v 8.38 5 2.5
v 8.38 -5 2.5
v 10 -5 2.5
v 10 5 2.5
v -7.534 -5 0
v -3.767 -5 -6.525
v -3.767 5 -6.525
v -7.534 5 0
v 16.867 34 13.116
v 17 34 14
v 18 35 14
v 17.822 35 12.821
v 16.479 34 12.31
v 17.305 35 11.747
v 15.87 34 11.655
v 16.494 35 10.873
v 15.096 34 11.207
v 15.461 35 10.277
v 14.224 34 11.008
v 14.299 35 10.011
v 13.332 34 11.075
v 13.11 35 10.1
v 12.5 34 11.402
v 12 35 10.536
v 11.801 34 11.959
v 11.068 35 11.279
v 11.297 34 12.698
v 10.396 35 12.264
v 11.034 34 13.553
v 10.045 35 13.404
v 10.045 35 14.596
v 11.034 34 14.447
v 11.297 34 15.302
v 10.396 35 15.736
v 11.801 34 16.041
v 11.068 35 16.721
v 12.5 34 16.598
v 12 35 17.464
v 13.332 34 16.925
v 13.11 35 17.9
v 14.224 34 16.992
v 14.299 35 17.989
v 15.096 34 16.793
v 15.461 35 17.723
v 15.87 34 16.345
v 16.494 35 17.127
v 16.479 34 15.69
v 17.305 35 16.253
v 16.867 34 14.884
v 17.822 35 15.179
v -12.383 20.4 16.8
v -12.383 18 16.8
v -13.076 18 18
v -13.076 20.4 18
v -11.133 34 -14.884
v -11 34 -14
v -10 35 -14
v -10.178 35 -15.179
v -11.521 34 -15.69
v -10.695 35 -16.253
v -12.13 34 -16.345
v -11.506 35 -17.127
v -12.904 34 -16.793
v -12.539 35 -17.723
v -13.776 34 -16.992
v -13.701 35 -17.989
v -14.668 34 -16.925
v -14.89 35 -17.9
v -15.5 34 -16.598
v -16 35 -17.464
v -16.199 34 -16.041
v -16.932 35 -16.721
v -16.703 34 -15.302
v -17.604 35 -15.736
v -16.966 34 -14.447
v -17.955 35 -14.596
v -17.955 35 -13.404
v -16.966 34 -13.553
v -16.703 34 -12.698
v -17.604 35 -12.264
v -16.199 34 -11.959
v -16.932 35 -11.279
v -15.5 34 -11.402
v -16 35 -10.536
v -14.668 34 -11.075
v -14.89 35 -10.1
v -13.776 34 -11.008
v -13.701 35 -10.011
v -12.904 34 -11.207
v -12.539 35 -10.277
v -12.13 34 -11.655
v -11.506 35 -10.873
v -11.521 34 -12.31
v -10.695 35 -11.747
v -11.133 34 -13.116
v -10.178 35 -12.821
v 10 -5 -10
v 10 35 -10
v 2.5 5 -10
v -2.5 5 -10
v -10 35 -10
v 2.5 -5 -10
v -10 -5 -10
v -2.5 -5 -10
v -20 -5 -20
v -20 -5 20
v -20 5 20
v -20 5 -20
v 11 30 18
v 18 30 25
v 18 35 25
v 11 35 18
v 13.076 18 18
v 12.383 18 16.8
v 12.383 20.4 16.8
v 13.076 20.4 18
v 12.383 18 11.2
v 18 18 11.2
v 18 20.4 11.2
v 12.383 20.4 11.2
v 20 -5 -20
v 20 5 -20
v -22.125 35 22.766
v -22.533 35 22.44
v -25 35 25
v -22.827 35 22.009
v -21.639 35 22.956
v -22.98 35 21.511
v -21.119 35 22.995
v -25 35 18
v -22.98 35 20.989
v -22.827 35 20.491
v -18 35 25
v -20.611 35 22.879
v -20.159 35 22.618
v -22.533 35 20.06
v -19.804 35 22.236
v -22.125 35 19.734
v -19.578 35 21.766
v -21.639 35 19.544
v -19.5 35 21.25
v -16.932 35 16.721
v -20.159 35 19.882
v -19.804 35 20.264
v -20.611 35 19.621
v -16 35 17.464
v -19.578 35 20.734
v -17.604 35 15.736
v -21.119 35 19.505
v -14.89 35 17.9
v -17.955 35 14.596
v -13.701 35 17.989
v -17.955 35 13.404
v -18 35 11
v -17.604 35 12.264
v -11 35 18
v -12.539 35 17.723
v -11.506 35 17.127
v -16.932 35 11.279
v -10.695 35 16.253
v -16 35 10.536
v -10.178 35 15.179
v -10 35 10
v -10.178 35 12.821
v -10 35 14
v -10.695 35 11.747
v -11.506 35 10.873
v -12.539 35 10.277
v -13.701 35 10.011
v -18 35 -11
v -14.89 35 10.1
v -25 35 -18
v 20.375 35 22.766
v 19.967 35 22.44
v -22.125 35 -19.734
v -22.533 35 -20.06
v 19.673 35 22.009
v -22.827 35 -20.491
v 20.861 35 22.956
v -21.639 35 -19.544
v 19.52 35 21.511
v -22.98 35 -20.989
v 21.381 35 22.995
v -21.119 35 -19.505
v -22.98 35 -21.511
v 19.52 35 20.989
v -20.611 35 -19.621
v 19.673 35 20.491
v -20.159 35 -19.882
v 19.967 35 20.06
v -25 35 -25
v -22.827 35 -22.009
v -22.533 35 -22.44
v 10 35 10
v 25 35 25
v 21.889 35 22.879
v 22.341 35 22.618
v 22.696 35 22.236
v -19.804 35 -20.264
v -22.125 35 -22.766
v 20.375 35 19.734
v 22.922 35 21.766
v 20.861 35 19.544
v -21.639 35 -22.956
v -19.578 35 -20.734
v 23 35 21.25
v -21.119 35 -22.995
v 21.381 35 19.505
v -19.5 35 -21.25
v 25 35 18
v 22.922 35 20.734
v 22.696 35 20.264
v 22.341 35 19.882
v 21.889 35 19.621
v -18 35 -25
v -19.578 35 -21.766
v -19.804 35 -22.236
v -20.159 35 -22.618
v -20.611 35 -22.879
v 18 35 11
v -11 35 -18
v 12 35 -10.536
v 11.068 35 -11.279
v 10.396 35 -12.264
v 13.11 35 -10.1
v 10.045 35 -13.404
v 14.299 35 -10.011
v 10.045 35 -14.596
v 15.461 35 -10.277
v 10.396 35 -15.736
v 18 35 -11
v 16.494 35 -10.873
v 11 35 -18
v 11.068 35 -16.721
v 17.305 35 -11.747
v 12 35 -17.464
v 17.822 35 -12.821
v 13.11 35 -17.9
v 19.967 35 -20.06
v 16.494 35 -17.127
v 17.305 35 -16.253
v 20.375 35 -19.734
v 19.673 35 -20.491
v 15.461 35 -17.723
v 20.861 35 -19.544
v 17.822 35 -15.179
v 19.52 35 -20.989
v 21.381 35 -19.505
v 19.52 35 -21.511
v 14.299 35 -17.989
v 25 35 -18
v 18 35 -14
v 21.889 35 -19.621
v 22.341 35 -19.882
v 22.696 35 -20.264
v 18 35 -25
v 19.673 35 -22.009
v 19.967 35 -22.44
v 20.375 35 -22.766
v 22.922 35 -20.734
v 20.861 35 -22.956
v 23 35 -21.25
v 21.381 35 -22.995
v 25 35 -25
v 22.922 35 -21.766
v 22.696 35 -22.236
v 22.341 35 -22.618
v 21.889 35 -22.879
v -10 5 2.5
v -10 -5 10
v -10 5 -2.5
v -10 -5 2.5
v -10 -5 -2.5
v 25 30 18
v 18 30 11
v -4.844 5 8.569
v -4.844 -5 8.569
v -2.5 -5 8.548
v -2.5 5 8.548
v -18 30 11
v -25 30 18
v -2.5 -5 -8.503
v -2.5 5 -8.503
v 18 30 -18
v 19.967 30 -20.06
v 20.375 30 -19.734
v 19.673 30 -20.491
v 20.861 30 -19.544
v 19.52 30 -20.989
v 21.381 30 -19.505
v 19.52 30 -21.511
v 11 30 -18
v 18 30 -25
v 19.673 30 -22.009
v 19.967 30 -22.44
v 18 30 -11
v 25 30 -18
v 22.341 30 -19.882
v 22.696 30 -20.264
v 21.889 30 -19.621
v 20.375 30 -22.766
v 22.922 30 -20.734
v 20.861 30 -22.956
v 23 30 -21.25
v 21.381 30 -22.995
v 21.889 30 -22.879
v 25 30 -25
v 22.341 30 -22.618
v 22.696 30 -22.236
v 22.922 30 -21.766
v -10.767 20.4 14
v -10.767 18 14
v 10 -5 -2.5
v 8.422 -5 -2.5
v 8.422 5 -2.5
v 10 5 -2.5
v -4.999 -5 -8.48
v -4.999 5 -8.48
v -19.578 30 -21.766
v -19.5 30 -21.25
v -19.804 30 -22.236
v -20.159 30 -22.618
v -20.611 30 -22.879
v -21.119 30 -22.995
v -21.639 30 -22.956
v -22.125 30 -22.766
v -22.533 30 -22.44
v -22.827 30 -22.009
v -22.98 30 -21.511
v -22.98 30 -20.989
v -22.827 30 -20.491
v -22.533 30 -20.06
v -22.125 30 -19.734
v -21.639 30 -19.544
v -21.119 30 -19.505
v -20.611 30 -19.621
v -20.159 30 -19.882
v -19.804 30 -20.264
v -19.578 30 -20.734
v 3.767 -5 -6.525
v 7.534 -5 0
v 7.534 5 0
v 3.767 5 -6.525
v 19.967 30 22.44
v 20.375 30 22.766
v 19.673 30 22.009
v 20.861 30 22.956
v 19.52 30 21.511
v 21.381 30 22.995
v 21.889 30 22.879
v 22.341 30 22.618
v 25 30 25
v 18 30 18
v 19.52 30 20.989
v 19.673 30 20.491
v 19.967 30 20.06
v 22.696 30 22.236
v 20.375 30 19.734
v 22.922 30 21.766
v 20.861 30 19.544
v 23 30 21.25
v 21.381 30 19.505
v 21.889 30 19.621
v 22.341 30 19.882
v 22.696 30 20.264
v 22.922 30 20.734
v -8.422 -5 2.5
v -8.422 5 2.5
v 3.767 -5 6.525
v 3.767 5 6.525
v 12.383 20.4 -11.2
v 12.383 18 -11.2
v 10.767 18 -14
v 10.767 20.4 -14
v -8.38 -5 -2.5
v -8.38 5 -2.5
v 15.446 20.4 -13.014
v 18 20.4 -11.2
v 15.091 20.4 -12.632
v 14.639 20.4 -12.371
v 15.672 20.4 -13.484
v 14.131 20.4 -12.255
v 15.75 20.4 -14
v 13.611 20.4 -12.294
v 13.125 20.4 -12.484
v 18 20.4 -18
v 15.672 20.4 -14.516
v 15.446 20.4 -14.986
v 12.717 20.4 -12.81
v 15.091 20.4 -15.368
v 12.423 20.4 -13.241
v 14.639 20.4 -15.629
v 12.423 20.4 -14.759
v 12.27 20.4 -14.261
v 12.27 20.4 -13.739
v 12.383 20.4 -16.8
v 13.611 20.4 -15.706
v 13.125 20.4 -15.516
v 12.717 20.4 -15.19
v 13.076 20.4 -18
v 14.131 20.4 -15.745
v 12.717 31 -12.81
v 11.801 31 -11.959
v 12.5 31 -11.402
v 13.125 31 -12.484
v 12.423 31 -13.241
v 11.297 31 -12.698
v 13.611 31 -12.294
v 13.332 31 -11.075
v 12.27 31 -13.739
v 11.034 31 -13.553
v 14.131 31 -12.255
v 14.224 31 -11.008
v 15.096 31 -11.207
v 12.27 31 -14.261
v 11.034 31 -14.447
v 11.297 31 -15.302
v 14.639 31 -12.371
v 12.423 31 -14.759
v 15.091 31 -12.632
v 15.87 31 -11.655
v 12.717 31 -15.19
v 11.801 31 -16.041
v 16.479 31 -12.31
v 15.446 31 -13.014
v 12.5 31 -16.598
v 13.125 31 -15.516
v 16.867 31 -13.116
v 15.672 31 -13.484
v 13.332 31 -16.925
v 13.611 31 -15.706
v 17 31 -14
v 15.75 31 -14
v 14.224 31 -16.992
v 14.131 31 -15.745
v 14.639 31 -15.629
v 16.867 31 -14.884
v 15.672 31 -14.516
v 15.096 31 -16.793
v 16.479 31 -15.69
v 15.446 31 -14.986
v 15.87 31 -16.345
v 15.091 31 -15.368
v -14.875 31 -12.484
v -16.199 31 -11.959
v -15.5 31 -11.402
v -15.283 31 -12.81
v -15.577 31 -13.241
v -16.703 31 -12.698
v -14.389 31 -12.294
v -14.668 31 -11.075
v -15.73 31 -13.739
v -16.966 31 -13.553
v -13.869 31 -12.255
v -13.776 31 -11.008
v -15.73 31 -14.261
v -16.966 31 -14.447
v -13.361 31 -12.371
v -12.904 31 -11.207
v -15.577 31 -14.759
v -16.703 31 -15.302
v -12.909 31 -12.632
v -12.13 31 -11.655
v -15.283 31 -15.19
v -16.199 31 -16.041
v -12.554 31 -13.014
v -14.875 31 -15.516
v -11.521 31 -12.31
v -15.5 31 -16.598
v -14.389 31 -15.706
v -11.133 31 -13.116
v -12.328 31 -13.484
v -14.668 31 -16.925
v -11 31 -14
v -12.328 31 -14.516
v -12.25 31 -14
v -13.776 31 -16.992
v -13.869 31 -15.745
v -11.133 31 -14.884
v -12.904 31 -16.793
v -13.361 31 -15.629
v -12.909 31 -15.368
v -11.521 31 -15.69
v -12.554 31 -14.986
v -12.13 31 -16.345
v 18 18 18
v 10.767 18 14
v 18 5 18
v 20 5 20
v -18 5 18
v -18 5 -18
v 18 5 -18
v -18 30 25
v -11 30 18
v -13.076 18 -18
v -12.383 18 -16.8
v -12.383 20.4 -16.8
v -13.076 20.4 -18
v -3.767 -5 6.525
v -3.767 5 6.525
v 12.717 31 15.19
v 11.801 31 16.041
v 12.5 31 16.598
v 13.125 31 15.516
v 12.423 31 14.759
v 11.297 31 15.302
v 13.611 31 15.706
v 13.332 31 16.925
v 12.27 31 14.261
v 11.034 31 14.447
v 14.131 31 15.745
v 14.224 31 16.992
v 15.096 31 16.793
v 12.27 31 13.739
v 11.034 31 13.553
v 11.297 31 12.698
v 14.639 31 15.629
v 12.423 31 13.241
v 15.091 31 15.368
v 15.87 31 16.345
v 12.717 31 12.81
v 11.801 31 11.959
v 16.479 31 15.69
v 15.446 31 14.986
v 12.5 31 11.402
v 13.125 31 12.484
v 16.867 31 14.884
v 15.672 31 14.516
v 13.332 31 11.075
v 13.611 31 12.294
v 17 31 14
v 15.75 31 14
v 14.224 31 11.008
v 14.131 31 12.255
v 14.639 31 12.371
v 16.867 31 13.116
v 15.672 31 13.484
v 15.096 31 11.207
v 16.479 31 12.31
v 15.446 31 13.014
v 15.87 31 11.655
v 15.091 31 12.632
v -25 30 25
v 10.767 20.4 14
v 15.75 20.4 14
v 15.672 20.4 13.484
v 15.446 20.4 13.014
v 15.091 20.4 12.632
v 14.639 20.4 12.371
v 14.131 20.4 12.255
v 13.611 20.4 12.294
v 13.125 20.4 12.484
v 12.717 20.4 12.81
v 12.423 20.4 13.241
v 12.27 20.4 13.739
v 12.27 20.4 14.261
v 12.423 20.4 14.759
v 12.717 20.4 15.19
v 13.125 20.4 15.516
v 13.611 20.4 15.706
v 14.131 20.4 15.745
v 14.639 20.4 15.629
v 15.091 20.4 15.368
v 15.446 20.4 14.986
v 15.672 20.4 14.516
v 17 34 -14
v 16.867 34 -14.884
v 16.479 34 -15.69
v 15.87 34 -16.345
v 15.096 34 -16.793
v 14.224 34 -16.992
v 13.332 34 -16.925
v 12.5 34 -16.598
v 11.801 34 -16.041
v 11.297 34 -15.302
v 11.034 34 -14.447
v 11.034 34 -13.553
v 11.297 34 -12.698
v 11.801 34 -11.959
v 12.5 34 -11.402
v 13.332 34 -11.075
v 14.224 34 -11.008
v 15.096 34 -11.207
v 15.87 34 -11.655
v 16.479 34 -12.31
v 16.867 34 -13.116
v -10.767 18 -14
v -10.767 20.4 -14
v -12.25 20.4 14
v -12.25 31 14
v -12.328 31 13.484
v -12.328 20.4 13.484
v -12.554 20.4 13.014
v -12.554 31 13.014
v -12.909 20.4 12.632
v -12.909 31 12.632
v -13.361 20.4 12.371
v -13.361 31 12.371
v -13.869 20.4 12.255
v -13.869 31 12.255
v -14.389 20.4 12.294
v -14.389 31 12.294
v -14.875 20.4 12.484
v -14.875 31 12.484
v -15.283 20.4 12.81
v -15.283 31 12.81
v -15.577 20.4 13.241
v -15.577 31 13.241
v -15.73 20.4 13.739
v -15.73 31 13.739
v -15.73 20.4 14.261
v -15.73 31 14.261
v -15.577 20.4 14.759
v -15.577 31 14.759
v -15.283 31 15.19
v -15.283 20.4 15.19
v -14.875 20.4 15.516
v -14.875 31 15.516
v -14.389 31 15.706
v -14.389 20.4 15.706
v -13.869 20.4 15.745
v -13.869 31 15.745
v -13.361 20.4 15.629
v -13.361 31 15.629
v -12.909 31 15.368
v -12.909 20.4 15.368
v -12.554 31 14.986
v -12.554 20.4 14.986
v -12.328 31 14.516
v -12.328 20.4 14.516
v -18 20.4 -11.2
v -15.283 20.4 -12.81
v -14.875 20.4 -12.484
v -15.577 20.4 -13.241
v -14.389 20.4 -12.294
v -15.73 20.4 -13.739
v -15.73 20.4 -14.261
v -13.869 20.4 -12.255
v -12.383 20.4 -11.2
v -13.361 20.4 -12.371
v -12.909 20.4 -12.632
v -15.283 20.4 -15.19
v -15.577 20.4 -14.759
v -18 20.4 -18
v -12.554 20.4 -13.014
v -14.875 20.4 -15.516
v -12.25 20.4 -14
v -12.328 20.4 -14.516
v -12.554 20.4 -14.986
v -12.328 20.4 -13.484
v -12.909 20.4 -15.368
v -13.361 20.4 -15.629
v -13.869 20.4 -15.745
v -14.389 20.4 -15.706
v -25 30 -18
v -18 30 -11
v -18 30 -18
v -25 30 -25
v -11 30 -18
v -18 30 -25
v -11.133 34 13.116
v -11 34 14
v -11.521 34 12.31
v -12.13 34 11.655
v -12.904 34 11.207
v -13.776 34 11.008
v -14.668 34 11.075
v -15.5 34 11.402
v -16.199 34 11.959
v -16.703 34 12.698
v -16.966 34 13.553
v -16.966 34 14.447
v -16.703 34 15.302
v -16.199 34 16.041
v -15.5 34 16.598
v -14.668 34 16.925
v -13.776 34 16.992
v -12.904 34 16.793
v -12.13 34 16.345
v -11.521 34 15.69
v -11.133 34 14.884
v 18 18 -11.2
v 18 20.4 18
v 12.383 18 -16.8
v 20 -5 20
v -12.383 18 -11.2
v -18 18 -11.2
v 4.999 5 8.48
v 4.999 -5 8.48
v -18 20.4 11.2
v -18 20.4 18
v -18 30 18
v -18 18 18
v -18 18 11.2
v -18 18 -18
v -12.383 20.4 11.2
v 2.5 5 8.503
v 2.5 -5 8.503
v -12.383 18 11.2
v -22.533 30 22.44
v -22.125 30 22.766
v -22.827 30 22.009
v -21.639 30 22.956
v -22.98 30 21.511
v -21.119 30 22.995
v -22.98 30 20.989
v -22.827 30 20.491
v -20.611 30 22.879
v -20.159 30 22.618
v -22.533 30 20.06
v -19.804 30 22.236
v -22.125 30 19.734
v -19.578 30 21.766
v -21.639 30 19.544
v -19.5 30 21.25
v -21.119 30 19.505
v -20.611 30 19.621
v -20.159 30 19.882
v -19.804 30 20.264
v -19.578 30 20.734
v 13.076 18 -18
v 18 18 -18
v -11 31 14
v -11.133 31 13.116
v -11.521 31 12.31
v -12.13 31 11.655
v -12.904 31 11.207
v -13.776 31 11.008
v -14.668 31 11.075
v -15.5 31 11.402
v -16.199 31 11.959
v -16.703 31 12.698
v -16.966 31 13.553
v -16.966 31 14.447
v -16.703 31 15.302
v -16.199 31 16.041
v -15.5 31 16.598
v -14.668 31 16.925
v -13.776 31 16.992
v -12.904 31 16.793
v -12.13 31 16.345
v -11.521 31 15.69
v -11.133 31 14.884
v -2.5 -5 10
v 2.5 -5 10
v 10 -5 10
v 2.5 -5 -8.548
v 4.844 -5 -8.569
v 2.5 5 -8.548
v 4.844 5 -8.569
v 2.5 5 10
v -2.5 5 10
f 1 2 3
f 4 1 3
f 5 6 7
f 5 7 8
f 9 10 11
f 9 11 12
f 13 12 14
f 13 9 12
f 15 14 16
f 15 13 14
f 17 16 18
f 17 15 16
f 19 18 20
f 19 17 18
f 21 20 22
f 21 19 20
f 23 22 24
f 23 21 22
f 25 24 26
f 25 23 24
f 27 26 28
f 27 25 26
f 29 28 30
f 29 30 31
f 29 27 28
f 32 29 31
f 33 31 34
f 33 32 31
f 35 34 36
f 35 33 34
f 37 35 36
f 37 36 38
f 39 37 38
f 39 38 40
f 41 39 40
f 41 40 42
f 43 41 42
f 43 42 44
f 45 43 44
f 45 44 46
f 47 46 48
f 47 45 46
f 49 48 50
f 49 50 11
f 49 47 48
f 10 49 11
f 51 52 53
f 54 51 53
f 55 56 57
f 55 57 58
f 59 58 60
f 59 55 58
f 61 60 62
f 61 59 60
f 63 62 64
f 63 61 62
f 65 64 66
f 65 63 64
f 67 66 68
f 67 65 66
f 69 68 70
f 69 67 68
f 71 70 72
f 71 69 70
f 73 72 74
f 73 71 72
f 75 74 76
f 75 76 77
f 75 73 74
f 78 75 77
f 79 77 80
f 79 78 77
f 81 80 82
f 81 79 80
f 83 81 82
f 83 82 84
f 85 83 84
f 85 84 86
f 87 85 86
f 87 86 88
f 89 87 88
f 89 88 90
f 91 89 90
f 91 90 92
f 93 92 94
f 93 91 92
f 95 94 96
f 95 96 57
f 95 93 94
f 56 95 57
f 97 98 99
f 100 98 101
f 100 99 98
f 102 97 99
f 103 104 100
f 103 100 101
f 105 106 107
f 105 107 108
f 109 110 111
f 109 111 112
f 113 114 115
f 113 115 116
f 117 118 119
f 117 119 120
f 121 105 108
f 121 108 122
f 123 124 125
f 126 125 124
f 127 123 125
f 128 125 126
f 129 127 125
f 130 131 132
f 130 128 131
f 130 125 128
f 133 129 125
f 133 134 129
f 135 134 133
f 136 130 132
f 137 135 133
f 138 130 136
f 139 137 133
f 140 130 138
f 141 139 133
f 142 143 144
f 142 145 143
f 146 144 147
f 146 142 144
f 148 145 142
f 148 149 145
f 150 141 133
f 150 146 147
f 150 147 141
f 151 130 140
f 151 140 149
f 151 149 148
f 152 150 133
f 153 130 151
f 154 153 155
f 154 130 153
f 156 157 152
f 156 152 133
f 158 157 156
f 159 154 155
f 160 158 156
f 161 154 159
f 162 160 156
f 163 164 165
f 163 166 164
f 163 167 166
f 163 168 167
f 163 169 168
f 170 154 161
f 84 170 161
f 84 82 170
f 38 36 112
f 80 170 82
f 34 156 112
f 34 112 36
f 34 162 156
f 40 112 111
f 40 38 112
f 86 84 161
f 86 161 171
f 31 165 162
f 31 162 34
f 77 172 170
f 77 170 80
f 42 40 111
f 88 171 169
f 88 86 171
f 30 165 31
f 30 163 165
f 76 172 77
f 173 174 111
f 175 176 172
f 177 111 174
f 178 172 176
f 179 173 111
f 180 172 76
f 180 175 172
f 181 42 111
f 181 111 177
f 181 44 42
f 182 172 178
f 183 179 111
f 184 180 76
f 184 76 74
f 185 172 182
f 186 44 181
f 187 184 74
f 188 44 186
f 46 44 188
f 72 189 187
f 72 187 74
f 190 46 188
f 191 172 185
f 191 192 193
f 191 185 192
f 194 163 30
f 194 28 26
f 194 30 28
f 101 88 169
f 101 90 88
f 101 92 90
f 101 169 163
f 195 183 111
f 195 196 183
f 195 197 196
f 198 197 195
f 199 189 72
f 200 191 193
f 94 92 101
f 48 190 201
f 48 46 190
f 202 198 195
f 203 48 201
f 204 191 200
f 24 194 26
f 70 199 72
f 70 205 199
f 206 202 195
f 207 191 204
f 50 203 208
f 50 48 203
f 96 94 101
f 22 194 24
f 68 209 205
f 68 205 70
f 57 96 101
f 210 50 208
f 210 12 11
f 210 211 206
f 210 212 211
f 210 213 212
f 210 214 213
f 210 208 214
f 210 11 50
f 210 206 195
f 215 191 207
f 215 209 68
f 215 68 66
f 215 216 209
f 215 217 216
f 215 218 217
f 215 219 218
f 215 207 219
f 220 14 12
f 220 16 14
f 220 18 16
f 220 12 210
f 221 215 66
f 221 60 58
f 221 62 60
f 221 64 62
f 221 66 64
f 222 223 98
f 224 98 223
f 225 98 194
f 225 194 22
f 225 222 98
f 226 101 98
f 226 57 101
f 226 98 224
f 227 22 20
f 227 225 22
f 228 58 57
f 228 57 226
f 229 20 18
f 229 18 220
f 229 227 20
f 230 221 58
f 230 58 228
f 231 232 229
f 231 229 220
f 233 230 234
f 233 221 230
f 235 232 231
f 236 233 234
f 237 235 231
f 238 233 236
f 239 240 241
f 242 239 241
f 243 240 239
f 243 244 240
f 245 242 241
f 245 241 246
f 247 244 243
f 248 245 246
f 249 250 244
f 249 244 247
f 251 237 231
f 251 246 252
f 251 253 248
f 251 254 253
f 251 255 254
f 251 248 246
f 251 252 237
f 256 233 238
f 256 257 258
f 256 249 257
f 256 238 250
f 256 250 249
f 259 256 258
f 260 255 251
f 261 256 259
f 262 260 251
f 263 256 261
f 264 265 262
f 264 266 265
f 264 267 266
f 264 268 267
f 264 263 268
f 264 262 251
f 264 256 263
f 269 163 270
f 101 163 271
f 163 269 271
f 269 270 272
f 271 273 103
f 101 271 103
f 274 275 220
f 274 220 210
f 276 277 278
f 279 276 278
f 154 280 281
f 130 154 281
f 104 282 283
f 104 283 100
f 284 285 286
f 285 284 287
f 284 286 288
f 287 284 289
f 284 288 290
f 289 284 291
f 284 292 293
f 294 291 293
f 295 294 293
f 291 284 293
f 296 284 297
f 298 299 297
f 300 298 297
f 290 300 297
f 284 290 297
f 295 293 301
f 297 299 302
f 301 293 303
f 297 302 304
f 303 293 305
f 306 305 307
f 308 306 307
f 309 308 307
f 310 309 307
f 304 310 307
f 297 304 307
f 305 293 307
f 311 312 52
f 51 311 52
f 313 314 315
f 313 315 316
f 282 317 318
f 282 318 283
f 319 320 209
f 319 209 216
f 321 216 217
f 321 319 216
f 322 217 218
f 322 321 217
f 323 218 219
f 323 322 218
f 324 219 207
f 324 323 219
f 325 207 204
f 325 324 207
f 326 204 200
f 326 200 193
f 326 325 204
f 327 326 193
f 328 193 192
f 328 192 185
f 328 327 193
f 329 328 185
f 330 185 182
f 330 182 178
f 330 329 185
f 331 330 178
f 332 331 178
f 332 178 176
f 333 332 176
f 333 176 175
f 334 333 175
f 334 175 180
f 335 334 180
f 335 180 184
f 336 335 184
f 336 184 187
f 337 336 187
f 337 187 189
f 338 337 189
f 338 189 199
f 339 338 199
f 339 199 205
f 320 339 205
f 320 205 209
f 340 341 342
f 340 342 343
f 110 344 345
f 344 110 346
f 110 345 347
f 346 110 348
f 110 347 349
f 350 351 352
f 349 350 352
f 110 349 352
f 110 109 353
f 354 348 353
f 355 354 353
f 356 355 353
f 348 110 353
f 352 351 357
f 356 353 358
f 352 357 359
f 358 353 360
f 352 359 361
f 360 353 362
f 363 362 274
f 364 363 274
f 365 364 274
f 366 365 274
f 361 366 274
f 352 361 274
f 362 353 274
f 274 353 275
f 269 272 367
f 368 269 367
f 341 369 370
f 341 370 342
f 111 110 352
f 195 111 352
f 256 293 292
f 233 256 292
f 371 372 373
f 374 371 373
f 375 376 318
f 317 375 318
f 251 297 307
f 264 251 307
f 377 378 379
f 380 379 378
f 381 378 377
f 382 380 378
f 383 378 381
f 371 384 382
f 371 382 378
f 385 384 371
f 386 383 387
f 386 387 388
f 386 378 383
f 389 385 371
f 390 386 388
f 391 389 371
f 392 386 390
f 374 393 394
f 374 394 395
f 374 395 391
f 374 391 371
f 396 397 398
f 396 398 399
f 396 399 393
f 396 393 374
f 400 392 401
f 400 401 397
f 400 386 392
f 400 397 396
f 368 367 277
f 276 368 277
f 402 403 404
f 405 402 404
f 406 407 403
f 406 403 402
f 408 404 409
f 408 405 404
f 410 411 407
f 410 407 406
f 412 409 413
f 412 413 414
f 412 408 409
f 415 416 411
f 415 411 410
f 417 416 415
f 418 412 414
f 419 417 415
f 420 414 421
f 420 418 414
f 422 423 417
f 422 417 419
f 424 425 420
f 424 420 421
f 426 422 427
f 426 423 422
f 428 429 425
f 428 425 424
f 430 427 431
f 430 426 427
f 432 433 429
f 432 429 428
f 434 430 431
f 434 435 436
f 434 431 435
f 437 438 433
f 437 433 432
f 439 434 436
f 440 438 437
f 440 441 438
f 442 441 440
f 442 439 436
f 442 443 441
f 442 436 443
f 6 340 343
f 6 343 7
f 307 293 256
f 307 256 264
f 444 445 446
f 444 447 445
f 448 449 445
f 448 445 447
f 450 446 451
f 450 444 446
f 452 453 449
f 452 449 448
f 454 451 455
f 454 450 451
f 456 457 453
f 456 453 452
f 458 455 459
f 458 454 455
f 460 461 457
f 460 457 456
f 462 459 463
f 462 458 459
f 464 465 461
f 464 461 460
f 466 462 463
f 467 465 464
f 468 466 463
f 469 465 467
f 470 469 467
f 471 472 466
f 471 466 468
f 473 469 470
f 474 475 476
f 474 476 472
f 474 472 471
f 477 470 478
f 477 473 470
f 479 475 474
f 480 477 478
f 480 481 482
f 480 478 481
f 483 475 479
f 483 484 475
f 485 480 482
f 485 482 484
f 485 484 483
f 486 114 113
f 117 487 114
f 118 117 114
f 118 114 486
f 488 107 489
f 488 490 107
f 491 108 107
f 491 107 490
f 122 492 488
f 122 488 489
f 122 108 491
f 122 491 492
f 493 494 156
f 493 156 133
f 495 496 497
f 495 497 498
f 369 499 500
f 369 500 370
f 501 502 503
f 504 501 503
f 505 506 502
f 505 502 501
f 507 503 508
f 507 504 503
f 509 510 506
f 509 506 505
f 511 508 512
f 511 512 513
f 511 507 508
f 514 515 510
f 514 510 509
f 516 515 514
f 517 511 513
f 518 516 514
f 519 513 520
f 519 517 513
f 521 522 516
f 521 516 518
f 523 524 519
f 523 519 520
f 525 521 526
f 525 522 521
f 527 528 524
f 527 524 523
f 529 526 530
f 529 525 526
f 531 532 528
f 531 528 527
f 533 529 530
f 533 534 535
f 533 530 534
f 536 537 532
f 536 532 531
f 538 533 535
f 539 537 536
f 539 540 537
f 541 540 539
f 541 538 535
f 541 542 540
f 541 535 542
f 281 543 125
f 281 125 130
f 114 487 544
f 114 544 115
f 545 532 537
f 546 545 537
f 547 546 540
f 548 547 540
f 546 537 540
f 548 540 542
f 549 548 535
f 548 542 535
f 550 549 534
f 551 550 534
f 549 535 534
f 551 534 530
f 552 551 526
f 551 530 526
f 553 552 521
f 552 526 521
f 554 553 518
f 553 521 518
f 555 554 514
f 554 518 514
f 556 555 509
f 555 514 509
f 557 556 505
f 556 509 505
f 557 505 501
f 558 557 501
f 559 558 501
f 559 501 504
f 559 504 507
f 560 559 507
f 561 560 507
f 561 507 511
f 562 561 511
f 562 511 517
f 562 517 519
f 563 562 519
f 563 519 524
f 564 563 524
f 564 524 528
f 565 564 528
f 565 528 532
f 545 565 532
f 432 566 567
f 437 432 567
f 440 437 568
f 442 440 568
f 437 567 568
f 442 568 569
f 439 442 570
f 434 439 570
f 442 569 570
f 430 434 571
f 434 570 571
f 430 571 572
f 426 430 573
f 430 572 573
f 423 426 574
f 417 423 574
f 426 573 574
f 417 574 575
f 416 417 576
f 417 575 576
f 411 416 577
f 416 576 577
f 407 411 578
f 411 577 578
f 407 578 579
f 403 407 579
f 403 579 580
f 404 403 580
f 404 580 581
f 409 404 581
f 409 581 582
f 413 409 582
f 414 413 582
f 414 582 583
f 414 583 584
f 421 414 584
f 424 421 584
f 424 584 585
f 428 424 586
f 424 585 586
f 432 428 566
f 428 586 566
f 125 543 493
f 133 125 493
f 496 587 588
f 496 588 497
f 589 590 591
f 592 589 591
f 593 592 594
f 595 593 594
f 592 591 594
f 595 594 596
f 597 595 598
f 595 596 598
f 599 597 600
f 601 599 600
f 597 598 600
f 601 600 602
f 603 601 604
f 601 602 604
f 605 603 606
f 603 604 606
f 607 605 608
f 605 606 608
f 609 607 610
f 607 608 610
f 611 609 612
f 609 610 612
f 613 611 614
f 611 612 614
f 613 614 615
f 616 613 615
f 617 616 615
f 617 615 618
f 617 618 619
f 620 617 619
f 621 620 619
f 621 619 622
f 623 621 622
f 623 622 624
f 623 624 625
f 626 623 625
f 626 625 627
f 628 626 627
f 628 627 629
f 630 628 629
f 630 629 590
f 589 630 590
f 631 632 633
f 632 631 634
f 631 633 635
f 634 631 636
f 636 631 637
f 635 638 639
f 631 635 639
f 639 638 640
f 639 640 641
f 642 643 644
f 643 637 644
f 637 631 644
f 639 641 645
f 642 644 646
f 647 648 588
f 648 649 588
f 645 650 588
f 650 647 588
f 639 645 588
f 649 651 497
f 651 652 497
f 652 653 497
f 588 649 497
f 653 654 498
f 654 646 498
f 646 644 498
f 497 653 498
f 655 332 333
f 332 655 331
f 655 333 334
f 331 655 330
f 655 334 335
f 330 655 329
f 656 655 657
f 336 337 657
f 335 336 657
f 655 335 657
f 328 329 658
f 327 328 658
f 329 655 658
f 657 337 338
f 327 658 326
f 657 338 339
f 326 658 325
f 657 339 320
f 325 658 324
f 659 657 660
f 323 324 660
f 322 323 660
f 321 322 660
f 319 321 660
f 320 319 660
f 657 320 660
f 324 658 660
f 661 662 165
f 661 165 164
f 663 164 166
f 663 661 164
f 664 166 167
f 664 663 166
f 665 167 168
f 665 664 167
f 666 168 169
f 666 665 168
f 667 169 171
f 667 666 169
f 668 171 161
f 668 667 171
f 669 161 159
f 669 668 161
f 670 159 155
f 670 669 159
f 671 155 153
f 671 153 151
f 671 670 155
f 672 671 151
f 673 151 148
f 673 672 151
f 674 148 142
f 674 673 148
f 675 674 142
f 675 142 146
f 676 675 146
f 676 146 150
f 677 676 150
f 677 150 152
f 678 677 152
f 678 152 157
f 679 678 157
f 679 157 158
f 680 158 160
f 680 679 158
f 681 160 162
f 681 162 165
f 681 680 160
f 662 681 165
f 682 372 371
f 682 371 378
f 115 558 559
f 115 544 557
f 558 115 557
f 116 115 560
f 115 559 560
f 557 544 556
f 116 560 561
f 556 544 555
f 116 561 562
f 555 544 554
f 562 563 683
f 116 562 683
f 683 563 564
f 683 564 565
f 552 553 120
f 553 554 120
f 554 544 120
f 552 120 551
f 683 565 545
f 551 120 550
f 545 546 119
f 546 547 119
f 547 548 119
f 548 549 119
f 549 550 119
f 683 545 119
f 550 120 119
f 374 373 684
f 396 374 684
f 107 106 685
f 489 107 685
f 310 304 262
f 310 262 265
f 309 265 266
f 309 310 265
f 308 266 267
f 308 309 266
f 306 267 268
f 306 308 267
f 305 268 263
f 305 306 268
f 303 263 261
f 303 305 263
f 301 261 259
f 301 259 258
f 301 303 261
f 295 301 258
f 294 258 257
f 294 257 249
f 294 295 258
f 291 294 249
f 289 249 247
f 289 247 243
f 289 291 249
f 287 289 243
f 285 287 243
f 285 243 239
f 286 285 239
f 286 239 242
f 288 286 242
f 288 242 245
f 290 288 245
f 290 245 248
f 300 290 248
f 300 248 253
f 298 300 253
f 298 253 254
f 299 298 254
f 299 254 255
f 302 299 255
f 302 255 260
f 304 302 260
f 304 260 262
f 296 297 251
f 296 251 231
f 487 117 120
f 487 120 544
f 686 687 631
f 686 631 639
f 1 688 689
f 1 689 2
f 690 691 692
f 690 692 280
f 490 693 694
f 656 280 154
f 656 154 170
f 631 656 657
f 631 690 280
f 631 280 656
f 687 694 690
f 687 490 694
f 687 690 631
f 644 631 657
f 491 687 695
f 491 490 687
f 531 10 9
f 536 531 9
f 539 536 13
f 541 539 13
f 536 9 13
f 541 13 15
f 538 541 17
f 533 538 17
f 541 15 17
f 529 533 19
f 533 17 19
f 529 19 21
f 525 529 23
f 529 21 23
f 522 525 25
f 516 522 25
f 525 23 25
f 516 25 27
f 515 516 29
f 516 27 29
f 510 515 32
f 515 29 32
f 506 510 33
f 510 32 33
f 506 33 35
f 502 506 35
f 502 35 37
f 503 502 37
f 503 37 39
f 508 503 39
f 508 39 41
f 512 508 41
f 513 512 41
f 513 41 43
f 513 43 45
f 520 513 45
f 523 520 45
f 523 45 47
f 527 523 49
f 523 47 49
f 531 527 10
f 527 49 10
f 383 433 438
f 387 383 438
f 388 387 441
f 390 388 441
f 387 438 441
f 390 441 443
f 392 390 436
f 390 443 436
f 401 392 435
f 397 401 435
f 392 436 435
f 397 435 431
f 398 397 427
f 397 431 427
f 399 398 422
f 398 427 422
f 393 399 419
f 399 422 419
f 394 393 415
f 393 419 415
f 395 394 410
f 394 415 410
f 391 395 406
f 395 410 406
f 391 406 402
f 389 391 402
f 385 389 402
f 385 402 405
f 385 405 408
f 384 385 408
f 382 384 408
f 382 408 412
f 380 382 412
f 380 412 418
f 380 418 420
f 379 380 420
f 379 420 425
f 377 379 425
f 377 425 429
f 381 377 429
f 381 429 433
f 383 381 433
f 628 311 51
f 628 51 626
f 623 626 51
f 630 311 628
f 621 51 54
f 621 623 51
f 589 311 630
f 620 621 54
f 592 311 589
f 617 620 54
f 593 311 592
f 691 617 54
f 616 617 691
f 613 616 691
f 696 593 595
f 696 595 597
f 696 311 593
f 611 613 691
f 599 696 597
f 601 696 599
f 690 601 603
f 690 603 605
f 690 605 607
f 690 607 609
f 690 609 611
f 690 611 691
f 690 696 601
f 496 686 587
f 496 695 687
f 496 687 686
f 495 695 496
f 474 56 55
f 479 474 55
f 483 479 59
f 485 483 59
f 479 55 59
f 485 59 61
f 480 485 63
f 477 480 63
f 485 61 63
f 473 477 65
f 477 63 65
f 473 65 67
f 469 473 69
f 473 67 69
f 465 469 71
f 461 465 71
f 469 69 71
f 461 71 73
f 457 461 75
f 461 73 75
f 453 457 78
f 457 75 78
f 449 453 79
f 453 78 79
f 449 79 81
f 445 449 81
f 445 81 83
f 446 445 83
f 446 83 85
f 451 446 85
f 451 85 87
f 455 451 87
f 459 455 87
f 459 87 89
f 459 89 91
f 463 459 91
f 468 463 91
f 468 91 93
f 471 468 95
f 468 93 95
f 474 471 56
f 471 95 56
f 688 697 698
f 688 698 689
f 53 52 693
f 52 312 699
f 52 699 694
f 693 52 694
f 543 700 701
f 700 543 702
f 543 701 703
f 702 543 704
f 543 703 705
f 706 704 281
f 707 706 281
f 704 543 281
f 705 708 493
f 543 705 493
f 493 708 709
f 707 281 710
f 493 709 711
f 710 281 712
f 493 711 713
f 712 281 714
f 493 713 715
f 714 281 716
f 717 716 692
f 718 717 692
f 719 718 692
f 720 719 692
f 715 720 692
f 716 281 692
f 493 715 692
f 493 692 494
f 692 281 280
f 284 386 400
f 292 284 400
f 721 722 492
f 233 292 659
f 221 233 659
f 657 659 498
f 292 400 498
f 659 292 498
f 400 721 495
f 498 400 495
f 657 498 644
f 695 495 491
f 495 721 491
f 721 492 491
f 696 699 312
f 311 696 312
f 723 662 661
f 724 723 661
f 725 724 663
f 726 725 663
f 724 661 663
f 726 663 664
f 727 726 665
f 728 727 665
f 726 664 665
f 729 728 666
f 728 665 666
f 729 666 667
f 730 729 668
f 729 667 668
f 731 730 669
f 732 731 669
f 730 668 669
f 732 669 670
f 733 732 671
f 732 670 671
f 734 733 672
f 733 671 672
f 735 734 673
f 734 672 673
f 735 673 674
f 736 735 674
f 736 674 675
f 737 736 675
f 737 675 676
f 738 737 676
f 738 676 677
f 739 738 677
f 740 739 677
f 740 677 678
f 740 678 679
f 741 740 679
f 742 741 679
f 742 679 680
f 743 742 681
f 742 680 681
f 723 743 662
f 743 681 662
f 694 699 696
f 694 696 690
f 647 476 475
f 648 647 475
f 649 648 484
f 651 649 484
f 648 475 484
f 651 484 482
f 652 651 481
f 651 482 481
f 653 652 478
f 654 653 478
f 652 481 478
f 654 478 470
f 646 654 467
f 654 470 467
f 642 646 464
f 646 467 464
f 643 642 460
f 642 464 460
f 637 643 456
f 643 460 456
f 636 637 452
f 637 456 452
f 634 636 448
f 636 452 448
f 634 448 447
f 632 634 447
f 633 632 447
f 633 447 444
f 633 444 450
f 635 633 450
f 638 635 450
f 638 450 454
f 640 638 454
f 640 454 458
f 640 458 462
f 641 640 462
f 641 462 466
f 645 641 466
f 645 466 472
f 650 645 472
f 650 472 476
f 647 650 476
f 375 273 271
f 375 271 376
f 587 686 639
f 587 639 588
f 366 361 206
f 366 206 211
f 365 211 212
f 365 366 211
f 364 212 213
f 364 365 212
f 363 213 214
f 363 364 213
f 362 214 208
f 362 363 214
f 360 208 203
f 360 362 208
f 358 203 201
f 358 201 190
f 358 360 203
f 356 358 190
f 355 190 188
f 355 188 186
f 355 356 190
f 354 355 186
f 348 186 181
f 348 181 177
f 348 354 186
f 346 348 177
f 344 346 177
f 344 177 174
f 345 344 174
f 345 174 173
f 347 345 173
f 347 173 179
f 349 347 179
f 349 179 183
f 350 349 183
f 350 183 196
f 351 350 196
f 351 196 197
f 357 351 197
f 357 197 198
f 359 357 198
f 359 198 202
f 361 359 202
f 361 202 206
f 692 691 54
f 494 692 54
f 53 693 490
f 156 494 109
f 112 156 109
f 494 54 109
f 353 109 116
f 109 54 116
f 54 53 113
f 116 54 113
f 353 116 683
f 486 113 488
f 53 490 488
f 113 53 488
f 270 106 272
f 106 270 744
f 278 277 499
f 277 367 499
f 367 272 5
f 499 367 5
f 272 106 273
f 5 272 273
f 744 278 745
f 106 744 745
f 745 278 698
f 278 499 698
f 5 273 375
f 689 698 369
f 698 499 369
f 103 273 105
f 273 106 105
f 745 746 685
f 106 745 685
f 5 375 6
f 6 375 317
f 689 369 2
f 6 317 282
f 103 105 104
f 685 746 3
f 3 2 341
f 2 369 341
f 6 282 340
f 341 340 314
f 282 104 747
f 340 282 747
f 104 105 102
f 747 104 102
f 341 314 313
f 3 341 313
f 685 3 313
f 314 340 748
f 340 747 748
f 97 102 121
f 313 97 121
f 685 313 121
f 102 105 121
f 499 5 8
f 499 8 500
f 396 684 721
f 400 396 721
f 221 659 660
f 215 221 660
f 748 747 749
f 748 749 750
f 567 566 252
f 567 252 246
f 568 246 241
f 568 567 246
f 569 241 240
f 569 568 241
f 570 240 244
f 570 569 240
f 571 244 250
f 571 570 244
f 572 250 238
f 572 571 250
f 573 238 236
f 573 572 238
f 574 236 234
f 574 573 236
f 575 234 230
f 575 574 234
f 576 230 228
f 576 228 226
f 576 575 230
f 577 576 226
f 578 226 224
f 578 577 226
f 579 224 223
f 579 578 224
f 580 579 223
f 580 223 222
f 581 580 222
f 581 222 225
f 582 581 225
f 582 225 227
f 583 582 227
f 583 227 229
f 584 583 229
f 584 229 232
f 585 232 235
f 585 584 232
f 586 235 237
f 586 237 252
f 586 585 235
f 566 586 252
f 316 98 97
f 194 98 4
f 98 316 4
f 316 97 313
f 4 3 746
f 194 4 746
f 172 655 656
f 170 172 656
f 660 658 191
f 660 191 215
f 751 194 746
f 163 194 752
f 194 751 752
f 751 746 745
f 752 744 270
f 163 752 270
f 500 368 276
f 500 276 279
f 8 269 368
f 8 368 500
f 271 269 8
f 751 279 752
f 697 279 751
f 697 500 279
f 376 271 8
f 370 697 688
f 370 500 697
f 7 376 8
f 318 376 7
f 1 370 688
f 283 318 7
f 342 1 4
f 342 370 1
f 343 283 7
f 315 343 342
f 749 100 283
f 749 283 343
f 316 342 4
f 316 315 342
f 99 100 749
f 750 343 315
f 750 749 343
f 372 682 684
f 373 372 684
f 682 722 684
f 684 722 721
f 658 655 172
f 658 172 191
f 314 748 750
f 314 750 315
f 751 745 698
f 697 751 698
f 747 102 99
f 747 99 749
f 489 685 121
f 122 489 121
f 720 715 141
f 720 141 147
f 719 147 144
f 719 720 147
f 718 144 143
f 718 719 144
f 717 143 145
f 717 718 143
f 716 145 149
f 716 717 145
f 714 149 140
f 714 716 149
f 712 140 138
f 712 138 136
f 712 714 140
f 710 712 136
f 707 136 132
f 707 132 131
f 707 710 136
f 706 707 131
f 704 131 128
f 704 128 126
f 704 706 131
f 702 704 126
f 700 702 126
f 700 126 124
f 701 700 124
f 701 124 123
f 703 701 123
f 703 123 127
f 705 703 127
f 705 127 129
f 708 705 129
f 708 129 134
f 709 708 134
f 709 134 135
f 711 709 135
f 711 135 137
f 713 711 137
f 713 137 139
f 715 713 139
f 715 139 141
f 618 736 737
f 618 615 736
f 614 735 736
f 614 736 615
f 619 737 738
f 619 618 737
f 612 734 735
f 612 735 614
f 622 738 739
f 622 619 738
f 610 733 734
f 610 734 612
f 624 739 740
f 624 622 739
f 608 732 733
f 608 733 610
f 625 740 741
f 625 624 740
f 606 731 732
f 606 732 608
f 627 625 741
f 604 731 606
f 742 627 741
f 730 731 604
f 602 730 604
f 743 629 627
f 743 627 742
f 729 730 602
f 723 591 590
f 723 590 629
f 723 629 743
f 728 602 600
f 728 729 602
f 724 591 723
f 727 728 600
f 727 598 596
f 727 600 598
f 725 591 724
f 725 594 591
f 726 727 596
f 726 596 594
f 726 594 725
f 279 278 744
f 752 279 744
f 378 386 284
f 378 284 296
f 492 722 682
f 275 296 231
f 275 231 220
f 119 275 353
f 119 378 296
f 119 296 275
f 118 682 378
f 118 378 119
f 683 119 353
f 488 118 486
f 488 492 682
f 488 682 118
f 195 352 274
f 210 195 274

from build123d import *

# Parameters (mm, degrees)
SKETCH1_W           = 36
SKETCH1_H           = 36
SKETCH1_W_2         = 20
SKETCH1_H_2         = 20
BOSS_EXTRUDE4_DEPTH = 35
SKETCH9_W           = 50
SKETCH9_H           = 50
SKETCH9_W_2         = 22
SKETCH9_H_2         = 22
BOSS_EXTRUDE6_DEPTH = 5
SKETCH10_R          = 1.75
CUT_EXTRUDE2_DEPTH  = 10
CUT_EXTRUDE3_DEPTH  = 10
SKETCH4_W           = 40
SKETCH4_H           = 40
BOSS_EXTRUDE7_DEPTH = 10
SKETCH12_R          = 3
CUT_EXTRUDE4_DEPTH  = 4
CHAMFER1_SIZE       = 1
SKETCH13_R          = 1.75
CUT_EXTRUDE5_DEPTH  = 13
CUT_EXTRUDE7_DEPTH  = 2.4


with BuildPart() as part:
    # Sketch1 → Boss-Extrude4 (new body)
    with BuildSketch(Plane(origin=(0, 0, 0), x_dir=(1, 0, 0), z_dir=(0, 1, 0))):
        Rectangle(SKETCH1_W, SKETCH1_H)
        Rectangle(SKETCH1_W_2, SKETCH1_H_2, mode=Mode.SUBTRACT)
    extrude(amount=BOSS_EXTRUDE4_DEPTH)

    # Sketch9 → Boss-Extrude6 (add)
    with BuildSketch(Plane(origin=(0, 30, 0), x_dir=(1, 0, 0), z_dir=(0, 1, 0))):
        Rectangle(SKETCH9_W, SKETCH9_H)
        Rectangle(SKETCH9_W_2, SKETCH9_H_2, mode=Mode.SUBTRACT)
    extrude(amount=BOSS_EXTRUDE6_DEPTH)

    # Sketch10 → Cut-Extrude2 (cut)
    with BuildSketch(Plane(origin=(0, 25, 0), x_dir=(1, 0, 0), z_dir=(0, 1, 0))):
        with Locations((-21.25, 21.25)):
            Circle(SKETCH10_R)
        with Locations((21.25, 21.25)):
            Circle(SKETCH10_R)
        with Locations((21.25, -21.25)):
            Circle(SKETCH10_R)
        with Locations((-21.25, -21.25)):
            Circle(SKETCH10_R)
    extrude(amount=CUT_EXTRUDE2_DEPTH, mode=Mode.SUBTRACT)

    # Sketch11 → Cut-Extrude3 (cut)
    with BuildSketch(Plane(origin=(0, 25, 0), x_dir=(1, 0, 0), z_dir=(0, 1, 0))):
        Polygon((11, 18), (-11, 18), (-18, 25), (18, 25), align=None)
        Polygon((18, 11), (18, -11), (25, -18), (25, 18), align=None)
        Polygon((11, -18), (-11, -18), (-18, -25), (18, -25), align=None)
        Polygon((-18, 11), (-18, -11), (-25, -18), (-25, 18), align=None)
    extrude(amount=CUT_EXTRUDE3_DEPTH, mode=Mode.SUBTRACT)

    # Sketch4 → Boss-Extrude7 (add)
    with BuildSketch(Plane(origin=(0, -5, 0), x_dir=(1, 0, 0), z_dir=(0, 1, 0))):
        Rectangle(SKETCH4_W, SKETCH4_H)
        Polygon((-2.5, -8.548100716), (-2.5, -10), (-10, -10), (-10, -2.5), (-8.422351936, -2.5), (-4.844140472, -8.569430344), align=None, mode=Mode.SUBTRACT)
        Polygon((7.534421013, 0), (3.767210506, 6.525), (-3.767210506, 6.525), (-7.534421013, 0), (-3.767210506, -6.525), (3.767210506, -6.525), align=None, mode=Mode.SUBTRACT)
        Polygon((10, 10), (2.5, 10), (2.5, 8.548100716), (4.844140472, 8.569430344), (8.422351936, 2.5), (10, 2.5), align=None, mode=Mode.SUBTRACT)
        Polygon((10, -10), (2.5, -10), (2.5, -8.502605089), (4.999274138, -8.47986388), (8.379580585, -2.5), (10, -2.5), align=None, mode=Mode.SUBTRACT)
        Polygon((-10, 10), (-10, 2.5), (-8.379580585, 2.5), (-4.999274138, 8.47986388), (-2.5, 8.502605089), (-2.5, 10), align=None, mode=Mode.SUBTRACT)
    extrude(amount=BOSS_EXTRUDE7_DEPTH)

    # Sketch12 → Cut-Extrude4 (cut)
    with BuildSketch(Plane(origin=(0, 35, 0), x_dir=(1, 0, 0), z_dir=(0, 1, 0))):
        with Locations((-14, 14)):
            Circle(SKETCH12_R)
        with Locations((14, 14)):
            Circle(SKETCH12_R)
        with Locations((-14, -14)):
            Circle(SKETCH12_R)
        with Locations((14, -14)):
            Circle(SKETCH12_R)
    extrude(amount=-CUT_EXTRUDE4_DEPTH, mode=Mode.SUBTRACT)

    # Chamfer1
    chamfer1_edges = [part.edges().sort_by_distance(p)[0] for p in [
        (11, 35, -14),
        (-17, 35, 14),
        (11, 35, 14),
        (-17, 35, -14),
    ]]
    chamfer(chamfer1_edges, length=CHAMFER1_SIZE)

    # Sketch13 → Cut-Extrude5 (cut)
    with BuildSketch(Plane(origin=(0, 31, 0), x_dir=(1, 0, 0), z_dir=(0, 1, 0))):
        with Locations((-14, 14)):
            Circle(SKETCH13_R)
        with Locations((14, 14)):
            Circle(SKETCH13_R)
        with Locations((14, -14)):
            Circle(SKETCH13_R)
        with Locations((-14, -14)):
            Circle(SKETCH13_R)
    extrude(amount=-CUT_EXTRUDE5_DEPTH, mode=Mode.SUBTRACT)

    # Sketch15 → Cut-Extrude7 (cut)
    with BuildSketch(Plane(origin=(0, 18, 0), x_dir=(1, 0, 0), z_dir=(0, 1, 0))):
        Polygon((-10.766838493, 14), (-12.383419246, 16.8), (-15.581535205, 22.339299329), (-24.484943605, 19.967960566), (-22.149680093, 11.2), (-15.616580754, 11.2), (-12.383419246, 11.2), align=None)
        Polygon((15.616580754, 11.2), (12.383419246, 11.2), (10.766838493, 14), (12.383419246, 16.8), (15.581535205, 22.339299329), (24.484943605, 19.967960566), (22.149680093, 11.2), align=None)
        Polygon((15.616580754, -11.2), (12.383419246, -11.2), (10.766838493, -14), (12.383419246, -16.8), (15.581535205, -22.339299329), (24.484943605, -19.967960566), (22.149680093, -11.2), align=None)
        Polygon((-15.616580754, -11.2), (-12.383419246, -11.2), (-10.766838493, -14), (-12.383419246, -16.8), (-15.581535205, -22.339299329), (-24.484943605, -19.967960566), (-22.149680093, -11.2), align=None)
    extrude(amount=CUT_EXTRUDE7_DEPTH, mode=Mode.SUBTRACT)


solid = part.part
